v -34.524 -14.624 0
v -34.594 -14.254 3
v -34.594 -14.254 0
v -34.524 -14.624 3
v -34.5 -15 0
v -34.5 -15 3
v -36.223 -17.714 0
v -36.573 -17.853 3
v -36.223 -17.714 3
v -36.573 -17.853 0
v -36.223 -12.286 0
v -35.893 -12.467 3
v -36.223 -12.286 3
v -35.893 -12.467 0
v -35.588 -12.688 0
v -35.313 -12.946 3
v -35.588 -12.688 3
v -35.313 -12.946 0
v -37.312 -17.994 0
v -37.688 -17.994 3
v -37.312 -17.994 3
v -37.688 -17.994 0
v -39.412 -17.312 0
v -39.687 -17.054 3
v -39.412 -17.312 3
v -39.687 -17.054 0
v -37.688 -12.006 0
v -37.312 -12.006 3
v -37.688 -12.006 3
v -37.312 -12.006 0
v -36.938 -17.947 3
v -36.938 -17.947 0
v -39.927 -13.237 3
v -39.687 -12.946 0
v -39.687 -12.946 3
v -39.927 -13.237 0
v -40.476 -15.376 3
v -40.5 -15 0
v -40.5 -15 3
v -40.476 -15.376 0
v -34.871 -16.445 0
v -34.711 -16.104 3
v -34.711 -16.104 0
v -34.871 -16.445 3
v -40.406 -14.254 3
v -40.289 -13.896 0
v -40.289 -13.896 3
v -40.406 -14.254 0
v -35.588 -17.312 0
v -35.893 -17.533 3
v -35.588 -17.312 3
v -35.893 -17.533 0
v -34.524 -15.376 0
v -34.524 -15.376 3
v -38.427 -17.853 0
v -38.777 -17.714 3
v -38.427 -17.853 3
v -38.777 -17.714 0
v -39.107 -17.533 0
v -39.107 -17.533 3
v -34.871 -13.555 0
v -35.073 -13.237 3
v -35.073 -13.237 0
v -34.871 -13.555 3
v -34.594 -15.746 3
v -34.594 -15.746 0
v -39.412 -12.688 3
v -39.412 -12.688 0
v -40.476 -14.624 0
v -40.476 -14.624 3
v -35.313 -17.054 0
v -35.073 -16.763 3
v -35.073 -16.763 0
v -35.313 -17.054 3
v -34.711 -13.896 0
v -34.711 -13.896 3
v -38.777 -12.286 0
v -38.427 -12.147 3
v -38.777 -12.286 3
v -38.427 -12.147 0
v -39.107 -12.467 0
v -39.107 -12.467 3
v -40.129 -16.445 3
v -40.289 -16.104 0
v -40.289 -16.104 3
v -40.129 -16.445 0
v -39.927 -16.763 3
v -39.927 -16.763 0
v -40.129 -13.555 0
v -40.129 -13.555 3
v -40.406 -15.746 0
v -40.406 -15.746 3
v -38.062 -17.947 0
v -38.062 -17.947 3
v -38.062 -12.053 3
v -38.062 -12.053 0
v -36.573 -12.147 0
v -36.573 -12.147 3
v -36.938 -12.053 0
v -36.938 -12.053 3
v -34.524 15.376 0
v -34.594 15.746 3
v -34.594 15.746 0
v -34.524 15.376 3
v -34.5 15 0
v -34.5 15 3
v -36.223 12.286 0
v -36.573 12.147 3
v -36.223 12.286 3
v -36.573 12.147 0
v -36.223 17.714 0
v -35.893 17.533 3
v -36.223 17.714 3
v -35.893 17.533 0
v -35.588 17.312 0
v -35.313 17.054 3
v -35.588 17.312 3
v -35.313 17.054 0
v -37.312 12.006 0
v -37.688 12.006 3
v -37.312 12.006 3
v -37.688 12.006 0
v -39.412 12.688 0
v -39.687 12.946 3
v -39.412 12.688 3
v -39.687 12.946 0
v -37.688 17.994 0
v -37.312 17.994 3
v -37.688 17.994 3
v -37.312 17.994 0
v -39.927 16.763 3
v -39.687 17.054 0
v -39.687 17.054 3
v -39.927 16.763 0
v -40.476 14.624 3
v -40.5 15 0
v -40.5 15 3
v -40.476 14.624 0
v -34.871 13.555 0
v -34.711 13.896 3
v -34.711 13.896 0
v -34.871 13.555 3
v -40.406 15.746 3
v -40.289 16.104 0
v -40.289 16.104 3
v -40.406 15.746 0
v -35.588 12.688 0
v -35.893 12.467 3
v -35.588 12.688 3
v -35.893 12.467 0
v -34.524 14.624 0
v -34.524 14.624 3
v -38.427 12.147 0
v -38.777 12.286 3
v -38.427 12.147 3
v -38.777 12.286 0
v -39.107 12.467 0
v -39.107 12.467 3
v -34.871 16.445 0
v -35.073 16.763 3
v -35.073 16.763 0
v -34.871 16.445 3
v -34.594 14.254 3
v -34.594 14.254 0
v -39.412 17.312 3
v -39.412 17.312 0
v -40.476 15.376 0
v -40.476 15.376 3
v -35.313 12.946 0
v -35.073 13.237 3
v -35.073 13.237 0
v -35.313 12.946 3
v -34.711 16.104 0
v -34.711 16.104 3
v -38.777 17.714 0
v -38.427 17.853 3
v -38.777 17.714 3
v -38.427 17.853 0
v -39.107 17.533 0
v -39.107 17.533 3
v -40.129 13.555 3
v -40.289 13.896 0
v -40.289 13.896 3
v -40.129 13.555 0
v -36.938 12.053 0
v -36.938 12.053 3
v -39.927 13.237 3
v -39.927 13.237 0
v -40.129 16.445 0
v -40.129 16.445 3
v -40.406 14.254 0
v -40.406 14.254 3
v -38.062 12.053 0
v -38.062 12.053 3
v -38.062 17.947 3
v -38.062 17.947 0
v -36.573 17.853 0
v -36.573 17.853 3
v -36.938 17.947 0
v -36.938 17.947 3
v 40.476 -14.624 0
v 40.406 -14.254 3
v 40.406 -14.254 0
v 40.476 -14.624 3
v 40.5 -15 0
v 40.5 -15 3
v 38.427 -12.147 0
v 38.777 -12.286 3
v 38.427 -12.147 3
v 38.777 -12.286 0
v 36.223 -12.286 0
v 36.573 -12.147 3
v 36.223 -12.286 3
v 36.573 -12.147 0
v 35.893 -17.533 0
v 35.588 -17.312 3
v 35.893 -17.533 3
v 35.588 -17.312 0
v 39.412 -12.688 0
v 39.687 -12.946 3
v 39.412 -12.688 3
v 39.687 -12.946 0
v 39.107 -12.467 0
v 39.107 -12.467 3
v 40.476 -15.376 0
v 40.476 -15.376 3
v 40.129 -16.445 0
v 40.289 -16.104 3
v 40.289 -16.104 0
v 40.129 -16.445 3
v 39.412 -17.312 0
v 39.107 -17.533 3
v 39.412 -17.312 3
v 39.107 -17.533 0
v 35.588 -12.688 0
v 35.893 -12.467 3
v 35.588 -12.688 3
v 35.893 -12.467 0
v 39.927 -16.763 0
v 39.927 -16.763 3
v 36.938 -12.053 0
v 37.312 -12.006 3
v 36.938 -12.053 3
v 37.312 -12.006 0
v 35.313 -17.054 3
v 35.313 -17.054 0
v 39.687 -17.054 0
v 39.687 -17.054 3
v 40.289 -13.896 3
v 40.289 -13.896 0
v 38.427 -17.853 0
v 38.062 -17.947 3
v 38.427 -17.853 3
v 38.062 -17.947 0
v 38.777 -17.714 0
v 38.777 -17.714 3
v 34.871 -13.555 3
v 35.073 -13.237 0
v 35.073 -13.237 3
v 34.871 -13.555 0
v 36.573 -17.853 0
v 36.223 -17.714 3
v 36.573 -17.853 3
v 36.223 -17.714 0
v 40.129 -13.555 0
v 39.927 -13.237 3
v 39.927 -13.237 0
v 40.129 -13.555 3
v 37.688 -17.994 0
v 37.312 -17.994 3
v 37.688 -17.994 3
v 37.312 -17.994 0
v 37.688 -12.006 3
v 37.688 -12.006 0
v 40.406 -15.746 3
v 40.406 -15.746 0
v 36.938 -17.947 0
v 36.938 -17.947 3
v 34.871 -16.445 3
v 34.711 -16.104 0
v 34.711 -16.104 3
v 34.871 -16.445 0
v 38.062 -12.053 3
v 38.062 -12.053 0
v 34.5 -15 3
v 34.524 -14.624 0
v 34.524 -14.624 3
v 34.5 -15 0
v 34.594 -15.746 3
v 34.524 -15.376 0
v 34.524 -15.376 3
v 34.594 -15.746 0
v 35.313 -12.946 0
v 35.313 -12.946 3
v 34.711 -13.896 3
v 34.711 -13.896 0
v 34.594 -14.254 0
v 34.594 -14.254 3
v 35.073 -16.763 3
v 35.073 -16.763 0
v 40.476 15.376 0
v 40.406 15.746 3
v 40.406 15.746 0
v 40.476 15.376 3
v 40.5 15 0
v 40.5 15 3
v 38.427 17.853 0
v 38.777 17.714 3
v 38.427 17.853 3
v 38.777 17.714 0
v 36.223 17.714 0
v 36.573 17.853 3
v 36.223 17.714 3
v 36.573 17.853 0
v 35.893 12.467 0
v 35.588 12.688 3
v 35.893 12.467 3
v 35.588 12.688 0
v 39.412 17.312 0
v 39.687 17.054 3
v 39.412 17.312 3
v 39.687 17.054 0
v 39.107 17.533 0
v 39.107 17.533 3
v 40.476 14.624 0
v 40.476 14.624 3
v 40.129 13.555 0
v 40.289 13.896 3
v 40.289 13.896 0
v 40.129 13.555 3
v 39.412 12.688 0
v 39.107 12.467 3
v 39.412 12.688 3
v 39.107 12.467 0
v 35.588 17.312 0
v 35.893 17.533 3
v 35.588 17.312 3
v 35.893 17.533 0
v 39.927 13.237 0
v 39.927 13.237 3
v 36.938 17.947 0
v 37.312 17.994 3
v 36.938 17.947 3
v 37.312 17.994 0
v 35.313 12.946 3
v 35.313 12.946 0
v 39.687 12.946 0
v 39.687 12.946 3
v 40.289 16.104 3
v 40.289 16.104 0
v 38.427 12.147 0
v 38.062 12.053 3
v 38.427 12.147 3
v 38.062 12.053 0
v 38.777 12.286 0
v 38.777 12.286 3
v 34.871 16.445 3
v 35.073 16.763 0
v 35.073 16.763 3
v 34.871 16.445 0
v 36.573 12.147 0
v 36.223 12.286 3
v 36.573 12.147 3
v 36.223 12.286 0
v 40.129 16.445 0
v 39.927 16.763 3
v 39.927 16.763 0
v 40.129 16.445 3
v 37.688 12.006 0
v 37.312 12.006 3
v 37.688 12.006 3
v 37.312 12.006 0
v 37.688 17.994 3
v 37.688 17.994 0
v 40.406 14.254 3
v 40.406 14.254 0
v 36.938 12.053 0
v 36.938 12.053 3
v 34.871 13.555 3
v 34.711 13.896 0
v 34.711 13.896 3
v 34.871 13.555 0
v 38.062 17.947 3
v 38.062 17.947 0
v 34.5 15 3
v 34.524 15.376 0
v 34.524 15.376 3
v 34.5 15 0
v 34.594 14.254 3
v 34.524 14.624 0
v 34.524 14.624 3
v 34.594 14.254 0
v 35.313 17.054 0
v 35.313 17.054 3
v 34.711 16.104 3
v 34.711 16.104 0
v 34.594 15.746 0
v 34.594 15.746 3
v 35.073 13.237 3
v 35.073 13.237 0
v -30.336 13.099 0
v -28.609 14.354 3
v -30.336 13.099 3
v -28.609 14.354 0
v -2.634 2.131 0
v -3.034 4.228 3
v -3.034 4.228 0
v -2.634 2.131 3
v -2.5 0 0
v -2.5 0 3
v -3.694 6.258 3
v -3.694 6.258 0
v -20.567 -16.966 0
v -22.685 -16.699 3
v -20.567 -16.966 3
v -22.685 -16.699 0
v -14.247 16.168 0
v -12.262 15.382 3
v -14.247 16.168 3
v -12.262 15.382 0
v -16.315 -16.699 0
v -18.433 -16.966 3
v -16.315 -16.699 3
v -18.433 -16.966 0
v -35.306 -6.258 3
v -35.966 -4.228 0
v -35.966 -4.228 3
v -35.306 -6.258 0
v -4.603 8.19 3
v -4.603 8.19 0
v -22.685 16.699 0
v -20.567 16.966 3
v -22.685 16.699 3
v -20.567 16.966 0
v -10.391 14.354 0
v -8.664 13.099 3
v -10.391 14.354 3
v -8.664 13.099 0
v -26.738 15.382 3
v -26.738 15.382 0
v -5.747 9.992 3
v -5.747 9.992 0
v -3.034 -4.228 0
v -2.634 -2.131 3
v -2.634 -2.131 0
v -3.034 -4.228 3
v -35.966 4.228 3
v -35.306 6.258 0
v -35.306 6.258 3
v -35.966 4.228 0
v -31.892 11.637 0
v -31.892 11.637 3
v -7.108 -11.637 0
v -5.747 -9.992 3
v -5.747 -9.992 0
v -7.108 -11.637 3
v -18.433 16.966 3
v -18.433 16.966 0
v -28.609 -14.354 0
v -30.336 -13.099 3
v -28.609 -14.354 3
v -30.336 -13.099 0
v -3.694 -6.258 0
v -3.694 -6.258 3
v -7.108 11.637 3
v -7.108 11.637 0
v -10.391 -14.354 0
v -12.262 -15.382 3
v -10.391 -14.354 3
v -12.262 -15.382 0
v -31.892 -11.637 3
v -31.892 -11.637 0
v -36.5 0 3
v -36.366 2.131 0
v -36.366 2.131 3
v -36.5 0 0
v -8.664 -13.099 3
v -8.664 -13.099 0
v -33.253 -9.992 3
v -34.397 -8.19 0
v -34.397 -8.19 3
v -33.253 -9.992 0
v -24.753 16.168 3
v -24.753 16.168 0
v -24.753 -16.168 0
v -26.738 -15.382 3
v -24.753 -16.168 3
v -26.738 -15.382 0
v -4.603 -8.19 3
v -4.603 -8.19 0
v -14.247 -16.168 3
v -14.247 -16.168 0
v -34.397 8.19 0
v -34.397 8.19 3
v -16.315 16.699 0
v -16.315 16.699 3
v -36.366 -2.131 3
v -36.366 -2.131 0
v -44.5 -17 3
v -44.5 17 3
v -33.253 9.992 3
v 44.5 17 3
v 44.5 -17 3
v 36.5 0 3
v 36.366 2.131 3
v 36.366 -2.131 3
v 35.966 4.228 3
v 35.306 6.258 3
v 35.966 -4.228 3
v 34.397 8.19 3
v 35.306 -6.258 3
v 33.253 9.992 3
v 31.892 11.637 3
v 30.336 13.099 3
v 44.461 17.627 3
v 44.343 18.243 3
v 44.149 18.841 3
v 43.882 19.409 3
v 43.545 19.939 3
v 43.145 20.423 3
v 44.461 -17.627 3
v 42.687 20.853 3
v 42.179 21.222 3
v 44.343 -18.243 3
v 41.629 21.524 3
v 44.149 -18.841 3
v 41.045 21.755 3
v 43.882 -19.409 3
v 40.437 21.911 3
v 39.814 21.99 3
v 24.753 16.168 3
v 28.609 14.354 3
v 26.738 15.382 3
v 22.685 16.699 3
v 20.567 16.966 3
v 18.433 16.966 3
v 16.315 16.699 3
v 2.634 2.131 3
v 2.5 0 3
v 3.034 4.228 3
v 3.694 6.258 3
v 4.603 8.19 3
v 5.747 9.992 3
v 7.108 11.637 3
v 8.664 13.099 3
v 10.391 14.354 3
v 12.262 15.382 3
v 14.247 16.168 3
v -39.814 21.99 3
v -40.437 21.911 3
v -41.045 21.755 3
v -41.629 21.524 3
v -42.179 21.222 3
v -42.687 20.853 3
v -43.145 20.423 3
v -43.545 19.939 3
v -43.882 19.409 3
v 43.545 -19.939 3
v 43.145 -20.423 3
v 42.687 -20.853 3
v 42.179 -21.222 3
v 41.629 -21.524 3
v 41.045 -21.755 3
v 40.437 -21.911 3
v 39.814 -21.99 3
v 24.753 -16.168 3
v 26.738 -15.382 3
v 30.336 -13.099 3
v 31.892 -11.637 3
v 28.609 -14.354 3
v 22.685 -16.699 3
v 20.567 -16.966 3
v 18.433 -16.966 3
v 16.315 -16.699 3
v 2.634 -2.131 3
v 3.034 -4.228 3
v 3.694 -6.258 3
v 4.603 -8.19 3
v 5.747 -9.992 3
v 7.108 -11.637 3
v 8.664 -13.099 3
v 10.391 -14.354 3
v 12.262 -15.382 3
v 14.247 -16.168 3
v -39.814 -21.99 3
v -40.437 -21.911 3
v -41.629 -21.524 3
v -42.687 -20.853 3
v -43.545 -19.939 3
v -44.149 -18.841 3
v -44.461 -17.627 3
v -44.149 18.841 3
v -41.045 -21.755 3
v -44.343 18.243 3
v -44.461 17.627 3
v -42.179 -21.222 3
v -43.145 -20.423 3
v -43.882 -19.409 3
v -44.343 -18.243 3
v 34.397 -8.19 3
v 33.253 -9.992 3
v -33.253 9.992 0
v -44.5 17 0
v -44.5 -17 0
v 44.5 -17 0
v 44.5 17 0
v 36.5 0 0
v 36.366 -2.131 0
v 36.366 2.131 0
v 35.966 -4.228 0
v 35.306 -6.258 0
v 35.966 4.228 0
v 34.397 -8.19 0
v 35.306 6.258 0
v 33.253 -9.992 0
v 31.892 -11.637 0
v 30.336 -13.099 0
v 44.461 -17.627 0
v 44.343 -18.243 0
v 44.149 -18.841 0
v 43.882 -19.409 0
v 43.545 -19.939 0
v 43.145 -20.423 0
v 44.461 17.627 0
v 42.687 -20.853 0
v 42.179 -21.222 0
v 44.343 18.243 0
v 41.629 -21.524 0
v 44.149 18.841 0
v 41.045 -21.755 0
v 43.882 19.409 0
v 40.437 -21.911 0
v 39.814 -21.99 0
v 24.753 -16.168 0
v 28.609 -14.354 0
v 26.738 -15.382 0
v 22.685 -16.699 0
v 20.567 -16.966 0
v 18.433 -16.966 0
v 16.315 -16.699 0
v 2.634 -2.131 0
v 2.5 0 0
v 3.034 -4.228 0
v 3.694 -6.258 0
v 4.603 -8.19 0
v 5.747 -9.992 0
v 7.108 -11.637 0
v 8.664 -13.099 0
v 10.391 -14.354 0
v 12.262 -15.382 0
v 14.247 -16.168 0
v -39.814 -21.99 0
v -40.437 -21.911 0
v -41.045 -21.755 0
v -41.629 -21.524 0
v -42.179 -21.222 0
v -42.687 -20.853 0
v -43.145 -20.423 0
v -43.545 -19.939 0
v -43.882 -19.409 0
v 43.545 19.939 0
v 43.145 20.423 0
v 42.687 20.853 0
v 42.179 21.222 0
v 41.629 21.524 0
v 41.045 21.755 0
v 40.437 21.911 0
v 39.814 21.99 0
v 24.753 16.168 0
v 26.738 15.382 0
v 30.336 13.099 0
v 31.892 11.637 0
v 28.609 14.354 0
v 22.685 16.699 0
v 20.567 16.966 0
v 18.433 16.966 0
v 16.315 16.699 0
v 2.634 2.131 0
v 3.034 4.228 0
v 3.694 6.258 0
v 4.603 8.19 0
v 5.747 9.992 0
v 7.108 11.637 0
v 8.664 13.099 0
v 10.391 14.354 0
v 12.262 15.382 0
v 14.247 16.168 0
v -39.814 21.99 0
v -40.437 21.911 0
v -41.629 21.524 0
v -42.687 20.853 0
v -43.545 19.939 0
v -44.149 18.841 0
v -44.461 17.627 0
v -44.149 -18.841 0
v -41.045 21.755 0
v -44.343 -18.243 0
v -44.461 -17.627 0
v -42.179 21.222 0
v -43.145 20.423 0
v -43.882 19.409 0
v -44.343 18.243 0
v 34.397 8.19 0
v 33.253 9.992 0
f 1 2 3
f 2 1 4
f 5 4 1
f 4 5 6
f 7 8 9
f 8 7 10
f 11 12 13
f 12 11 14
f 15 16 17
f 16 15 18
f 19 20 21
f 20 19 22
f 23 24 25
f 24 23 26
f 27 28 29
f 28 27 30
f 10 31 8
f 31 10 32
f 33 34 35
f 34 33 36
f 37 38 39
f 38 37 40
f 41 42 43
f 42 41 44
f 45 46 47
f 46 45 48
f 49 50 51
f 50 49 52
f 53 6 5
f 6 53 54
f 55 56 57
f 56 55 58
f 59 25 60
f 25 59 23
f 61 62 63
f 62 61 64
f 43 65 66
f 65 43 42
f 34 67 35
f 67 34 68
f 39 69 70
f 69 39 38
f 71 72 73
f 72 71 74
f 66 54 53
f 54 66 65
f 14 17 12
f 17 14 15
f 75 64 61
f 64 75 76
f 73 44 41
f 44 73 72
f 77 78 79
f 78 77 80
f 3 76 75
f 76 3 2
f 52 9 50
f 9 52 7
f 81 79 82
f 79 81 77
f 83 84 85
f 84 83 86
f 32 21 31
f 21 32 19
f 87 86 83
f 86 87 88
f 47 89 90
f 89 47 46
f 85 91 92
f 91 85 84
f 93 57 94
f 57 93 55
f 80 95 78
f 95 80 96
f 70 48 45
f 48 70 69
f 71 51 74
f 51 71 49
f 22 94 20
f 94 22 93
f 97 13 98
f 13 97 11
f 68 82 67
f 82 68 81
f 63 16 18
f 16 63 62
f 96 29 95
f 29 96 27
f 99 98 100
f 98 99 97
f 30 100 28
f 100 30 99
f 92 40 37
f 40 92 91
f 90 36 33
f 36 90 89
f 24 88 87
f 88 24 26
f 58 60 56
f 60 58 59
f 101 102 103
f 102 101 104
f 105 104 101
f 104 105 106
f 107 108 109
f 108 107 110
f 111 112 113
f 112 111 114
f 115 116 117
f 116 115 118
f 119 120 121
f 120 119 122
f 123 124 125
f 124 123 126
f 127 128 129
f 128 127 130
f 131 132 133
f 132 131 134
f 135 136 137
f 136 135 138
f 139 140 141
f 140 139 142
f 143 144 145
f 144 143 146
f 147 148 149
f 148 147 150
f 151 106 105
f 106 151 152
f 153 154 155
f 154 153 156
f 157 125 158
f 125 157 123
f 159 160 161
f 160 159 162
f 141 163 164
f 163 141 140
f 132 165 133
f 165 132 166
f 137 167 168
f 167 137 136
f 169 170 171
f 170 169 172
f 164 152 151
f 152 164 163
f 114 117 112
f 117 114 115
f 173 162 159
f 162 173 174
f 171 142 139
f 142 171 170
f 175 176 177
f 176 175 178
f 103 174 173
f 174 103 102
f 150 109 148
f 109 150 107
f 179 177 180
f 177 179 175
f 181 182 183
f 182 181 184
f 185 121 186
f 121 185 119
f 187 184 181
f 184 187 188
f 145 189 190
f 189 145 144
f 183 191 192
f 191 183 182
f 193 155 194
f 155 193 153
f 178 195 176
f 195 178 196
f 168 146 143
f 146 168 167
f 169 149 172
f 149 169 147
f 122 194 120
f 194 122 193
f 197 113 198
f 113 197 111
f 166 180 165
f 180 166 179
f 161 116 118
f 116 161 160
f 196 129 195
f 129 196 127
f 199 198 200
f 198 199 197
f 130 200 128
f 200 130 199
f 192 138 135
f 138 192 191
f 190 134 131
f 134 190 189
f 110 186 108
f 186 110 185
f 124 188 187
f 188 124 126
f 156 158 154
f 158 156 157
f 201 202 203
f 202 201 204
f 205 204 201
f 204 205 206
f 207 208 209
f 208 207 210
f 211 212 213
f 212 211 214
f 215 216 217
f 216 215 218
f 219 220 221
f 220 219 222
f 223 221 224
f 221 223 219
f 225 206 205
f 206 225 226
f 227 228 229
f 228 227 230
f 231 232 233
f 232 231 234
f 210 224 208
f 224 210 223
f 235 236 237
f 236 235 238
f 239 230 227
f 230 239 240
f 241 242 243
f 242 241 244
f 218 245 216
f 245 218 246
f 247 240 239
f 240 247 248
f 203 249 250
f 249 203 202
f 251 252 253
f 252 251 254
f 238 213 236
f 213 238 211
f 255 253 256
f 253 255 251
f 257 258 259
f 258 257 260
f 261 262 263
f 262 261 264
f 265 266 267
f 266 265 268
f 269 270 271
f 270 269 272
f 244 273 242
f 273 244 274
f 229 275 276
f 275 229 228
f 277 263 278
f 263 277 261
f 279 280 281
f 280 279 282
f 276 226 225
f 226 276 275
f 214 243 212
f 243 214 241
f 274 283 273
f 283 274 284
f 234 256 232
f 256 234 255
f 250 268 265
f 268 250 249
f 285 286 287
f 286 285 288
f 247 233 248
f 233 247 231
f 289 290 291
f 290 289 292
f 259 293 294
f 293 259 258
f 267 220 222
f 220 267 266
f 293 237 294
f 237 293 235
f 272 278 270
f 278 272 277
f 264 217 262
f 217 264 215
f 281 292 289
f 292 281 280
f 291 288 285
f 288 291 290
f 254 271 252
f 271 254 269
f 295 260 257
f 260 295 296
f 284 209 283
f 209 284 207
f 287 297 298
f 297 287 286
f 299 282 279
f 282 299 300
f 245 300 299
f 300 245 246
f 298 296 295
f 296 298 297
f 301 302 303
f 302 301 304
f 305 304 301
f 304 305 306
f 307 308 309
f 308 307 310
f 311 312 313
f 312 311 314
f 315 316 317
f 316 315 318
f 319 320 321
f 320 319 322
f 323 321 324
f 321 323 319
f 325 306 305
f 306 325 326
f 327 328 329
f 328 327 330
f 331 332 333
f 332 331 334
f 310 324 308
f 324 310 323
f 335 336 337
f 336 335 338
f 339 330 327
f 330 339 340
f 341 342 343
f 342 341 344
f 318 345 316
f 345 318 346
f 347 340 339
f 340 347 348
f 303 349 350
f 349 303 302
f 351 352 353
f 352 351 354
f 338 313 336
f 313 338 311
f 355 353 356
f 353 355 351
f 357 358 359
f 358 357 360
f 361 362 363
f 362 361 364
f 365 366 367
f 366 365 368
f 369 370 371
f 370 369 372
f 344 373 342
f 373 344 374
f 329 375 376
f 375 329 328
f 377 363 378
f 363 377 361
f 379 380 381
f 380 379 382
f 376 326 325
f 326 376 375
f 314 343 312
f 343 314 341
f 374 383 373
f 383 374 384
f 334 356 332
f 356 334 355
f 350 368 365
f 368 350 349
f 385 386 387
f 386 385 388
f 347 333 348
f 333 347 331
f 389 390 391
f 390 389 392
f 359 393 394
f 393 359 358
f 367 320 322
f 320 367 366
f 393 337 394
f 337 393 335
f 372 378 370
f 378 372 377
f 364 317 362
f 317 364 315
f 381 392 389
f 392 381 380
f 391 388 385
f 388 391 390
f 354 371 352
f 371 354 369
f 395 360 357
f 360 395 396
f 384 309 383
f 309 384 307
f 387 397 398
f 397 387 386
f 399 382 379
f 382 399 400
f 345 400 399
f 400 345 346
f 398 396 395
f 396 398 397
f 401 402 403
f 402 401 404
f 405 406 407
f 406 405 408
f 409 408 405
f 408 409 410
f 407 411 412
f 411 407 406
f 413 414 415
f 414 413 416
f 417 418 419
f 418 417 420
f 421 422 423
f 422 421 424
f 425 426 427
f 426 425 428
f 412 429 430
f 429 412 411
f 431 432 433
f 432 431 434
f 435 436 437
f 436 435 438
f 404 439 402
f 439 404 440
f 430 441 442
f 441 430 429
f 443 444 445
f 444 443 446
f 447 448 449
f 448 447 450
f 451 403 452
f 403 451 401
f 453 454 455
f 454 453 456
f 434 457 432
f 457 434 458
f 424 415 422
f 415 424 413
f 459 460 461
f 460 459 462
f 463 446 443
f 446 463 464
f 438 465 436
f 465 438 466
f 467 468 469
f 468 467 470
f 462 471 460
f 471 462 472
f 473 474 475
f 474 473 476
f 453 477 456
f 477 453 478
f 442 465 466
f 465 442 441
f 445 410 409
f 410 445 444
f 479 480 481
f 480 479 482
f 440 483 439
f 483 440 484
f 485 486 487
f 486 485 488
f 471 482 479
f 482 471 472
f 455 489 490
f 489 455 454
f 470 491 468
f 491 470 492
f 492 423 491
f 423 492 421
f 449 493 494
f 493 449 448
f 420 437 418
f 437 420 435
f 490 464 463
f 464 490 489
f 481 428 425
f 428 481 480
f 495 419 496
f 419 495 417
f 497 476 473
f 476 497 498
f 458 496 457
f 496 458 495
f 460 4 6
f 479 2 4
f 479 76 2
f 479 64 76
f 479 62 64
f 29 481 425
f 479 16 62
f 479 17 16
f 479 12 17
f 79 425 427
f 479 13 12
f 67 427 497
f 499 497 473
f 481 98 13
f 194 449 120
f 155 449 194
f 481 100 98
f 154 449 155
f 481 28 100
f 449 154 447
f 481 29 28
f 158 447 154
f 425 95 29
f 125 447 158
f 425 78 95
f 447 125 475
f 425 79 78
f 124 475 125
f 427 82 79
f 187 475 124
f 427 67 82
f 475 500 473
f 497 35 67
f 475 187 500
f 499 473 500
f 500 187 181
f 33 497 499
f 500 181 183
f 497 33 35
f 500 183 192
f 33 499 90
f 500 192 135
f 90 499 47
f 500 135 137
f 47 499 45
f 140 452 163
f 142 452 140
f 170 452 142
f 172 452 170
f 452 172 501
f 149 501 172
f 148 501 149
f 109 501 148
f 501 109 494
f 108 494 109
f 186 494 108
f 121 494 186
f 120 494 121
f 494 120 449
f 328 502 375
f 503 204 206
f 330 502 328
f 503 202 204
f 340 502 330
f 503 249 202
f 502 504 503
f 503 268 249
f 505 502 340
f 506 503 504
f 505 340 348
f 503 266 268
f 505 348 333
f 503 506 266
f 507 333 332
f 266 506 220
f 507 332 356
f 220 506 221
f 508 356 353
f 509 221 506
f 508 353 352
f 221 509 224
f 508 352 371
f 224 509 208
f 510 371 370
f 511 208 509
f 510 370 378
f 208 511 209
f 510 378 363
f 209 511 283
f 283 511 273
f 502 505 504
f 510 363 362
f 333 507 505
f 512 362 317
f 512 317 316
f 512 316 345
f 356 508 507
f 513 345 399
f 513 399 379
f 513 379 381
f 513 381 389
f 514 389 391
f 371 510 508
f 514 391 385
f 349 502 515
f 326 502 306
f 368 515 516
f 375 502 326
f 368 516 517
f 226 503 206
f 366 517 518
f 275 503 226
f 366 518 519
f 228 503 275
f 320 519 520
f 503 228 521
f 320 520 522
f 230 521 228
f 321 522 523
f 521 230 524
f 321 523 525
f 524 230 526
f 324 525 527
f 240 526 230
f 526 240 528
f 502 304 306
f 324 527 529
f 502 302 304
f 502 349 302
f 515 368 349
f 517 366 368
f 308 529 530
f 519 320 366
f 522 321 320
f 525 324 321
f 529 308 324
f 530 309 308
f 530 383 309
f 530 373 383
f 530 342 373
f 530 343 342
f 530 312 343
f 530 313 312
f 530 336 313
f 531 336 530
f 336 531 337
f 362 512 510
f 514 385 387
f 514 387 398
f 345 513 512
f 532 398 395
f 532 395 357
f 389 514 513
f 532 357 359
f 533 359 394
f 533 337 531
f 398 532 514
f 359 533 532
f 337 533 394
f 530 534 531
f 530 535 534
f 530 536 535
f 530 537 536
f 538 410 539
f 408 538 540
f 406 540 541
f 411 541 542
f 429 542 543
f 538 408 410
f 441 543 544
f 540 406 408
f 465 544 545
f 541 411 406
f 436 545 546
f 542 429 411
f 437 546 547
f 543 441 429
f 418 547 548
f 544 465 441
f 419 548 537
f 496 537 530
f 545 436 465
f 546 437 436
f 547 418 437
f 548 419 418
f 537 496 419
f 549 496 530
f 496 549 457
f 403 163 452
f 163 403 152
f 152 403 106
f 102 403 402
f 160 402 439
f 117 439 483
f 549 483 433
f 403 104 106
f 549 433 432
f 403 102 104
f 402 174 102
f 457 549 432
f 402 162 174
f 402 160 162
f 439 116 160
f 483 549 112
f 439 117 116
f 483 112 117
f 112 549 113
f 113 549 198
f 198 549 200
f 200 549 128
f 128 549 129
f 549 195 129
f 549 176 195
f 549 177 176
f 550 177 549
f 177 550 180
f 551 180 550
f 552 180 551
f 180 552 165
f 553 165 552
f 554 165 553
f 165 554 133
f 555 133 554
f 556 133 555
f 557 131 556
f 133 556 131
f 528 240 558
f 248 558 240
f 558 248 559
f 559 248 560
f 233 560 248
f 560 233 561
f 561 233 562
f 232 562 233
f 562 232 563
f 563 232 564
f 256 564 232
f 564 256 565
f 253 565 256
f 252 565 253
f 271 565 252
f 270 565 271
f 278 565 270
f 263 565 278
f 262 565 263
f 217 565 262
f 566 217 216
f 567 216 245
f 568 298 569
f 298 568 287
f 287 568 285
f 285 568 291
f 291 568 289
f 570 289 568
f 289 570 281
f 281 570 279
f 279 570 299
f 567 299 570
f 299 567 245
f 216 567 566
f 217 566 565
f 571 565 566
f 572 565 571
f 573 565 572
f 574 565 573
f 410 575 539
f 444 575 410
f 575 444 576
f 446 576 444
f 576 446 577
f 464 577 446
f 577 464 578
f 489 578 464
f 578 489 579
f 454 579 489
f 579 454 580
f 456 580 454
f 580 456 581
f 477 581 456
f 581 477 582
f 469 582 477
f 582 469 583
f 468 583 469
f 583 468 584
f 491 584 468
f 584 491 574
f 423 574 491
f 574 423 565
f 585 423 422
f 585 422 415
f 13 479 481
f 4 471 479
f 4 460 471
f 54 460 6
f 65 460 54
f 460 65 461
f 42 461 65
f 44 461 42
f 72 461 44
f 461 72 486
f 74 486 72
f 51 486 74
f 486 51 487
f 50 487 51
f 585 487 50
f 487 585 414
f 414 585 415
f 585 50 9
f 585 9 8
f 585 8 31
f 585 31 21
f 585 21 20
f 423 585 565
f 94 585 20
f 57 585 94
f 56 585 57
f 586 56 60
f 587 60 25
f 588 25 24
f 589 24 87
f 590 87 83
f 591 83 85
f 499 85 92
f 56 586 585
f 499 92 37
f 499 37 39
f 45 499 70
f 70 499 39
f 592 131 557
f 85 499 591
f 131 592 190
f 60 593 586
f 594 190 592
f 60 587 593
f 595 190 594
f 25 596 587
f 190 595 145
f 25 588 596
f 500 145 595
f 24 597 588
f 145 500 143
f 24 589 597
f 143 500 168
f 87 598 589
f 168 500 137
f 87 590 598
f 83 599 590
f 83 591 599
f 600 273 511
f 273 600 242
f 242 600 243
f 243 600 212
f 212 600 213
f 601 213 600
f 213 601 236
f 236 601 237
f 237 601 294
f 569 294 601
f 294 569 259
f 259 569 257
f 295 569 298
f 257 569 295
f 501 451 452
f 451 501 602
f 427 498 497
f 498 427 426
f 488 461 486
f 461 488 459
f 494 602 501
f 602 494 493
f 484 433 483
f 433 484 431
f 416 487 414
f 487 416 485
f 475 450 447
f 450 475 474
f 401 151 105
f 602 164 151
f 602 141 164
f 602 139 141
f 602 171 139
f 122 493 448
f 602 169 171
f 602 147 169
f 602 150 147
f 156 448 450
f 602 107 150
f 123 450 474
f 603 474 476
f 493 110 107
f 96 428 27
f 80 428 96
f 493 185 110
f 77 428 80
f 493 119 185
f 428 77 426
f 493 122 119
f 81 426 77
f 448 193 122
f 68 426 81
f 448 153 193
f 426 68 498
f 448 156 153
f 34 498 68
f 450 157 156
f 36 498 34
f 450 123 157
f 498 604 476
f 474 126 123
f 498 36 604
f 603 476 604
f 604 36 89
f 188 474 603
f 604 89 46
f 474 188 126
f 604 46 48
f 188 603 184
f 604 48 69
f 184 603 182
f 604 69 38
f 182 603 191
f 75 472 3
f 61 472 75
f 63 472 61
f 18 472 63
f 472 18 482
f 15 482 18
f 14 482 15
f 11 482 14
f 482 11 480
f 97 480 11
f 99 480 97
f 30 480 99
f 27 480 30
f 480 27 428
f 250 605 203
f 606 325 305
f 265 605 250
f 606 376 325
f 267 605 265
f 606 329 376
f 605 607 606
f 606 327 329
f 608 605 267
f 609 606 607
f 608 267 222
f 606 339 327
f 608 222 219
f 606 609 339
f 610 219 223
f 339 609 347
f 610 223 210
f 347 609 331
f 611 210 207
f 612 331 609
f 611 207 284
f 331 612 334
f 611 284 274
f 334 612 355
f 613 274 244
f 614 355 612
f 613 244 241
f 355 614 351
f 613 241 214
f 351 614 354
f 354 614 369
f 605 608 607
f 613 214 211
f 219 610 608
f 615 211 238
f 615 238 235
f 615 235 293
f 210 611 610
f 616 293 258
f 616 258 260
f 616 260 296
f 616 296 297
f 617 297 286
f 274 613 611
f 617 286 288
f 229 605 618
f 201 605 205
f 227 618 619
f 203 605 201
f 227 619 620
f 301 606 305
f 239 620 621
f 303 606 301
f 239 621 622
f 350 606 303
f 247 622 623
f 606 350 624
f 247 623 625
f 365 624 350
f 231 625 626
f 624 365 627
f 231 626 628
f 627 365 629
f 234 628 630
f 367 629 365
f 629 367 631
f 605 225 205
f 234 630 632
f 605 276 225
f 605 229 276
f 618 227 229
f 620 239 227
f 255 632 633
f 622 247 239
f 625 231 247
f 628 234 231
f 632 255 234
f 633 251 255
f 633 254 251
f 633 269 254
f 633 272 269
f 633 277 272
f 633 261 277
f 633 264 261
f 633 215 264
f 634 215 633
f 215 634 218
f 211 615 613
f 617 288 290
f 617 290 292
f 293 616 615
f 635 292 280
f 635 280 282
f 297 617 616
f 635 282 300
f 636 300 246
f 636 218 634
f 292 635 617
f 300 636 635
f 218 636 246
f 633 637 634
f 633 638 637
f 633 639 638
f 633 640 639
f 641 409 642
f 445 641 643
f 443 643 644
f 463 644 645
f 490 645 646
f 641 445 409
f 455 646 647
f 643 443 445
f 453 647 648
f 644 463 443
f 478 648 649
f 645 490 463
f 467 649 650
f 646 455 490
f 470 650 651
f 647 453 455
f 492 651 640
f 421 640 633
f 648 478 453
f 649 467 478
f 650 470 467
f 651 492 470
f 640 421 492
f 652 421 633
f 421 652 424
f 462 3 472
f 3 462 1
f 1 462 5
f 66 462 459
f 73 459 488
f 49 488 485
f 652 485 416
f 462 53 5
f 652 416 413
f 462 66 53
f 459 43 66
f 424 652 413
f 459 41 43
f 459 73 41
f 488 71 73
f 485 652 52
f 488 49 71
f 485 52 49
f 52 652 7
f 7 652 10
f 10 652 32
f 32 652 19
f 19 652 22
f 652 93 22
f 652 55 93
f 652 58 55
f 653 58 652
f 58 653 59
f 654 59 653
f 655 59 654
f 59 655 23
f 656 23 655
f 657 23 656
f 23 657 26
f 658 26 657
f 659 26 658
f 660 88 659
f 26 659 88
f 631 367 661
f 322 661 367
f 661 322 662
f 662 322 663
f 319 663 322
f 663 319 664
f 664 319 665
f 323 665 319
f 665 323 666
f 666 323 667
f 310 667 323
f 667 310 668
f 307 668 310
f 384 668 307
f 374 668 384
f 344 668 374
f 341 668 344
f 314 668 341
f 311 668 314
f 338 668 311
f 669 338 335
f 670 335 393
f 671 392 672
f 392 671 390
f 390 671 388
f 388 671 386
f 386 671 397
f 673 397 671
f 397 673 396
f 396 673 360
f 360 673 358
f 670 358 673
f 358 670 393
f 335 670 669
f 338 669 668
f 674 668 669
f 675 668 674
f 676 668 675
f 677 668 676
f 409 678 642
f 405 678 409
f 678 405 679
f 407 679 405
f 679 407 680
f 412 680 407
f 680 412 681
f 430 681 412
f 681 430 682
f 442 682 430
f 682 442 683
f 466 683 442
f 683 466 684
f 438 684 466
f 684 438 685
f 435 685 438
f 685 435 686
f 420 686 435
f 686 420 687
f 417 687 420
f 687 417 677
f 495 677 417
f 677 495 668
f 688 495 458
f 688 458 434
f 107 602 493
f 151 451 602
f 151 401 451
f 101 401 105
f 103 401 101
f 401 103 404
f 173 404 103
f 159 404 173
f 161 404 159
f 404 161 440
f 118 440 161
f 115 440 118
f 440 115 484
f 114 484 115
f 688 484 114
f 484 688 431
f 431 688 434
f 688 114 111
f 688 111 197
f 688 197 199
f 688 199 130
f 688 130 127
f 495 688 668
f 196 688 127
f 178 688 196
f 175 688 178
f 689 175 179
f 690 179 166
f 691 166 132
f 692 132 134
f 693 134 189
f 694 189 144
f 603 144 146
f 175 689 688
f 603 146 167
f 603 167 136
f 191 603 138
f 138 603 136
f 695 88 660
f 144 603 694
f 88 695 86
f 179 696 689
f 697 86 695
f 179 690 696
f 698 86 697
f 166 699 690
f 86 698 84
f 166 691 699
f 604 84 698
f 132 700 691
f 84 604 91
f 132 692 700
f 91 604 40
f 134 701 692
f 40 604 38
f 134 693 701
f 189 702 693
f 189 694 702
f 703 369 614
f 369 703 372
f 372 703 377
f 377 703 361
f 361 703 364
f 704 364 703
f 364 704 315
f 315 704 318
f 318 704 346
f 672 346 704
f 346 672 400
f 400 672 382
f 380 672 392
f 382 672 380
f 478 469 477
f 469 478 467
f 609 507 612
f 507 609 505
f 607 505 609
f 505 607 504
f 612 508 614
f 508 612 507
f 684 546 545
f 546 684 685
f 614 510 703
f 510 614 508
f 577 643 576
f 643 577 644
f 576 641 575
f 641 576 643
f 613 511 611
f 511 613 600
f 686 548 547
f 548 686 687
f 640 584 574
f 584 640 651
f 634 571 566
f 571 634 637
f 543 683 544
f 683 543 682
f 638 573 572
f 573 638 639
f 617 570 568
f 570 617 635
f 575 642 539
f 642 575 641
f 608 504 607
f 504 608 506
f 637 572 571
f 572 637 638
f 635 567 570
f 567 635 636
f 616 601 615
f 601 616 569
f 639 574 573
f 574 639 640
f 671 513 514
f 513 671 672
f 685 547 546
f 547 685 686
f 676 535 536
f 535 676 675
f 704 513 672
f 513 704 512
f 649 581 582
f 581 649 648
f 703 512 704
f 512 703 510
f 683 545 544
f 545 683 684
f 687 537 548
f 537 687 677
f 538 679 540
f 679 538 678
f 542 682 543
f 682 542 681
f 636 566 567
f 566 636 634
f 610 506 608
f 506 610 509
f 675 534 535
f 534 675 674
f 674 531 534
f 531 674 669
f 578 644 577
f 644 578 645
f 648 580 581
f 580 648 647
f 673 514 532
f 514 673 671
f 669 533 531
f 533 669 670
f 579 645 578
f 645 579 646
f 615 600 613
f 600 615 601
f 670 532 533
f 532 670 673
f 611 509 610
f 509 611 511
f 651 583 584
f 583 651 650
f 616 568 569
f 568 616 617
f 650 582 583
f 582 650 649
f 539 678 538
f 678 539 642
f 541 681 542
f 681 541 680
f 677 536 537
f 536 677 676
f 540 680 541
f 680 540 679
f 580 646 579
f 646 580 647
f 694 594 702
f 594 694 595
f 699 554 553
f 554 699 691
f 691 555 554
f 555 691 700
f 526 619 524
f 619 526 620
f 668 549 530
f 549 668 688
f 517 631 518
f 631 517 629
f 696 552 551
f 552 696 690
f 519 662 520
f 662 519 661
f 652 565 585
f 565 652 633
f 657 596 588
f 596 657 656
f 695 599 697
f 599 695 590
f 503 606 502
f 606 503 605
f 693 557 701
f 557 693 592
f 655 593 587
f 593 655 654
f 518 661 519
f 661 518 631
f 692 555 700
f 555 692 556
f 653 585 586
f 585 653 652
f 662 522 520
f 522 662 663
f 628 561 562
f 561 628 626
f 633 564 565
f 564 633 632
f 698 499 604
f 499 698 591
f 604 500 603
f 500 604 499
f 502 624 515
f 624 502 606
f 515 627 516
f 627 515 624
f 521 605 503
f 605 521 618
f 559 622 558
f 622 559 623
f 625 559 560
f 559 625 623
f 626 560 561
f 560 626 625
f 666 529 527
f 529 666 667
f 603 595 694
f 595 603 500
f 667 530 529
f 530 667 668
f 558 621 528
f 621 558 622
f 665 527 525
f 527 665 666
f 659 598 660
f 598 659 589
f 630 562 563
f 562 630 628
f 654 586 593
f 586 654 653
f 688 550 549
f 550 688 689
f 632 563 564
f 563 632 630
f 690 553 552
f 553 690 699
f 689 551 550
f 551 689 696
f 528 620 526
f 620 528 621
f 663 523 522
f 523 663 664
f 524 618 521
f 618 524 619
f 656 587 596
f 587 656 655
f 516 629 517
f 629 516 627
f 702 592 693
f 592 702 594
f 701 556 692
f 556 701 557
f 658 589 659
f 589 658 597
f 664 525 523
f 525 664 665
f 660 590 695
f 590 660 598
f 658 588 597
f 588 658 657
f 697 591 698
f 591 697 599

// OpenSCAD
$fn = 50;


difference() {
	union() {
		hull() {
			translate(v = [-39.5000000000, 17.0000000000, 0]) {
				cylinder(h = 3, r = 5);
			}
			translate(v = [39.5000000000, 17.0000000000, 0]) {
				cylinder(h = 3, r = 5);
			}
			translate(v = [-39.5000000000, -17.0000000000, 0]) {
				cylinder(h = 3, r = 5);
			}
			translate(v = [39.5000000000, -17.0000000000, 0]) {
				cylinder(h = 3, r = 5);
			}
		}
	}
	union() {
		#translate(v = [-37.5000000000, -15.0000000000, -100.0000000000]) {
			cylinder(h = 200, r = 3.0000000000);
		}
		#translate(v = [-37.5000000000, 15.0000000000, -100.0000000000]) {
			cylinder(h = 200, r = 3.0000000000);
		}
		#translate(v = [37.5000000000, -15.0000000000, -100.0000000000]) {
			cylinder(h = 200, r = 3.0000000000);
		}
		#translate(v = [37.5000000000, 15.0000000000, -100.0000000000]) {
			cylinder(h = 200, r = 3.0000000000);
		}
		#translate(v = [-19.5000000000, 0, 0]) {
			cylinder(h = 3, r = 17.0000000000);
		}
		#translate(v = [19.5000000000, 0, 0]) {
			cylinder(h = 3, r = 17.0000000000);
		}
	}
}
